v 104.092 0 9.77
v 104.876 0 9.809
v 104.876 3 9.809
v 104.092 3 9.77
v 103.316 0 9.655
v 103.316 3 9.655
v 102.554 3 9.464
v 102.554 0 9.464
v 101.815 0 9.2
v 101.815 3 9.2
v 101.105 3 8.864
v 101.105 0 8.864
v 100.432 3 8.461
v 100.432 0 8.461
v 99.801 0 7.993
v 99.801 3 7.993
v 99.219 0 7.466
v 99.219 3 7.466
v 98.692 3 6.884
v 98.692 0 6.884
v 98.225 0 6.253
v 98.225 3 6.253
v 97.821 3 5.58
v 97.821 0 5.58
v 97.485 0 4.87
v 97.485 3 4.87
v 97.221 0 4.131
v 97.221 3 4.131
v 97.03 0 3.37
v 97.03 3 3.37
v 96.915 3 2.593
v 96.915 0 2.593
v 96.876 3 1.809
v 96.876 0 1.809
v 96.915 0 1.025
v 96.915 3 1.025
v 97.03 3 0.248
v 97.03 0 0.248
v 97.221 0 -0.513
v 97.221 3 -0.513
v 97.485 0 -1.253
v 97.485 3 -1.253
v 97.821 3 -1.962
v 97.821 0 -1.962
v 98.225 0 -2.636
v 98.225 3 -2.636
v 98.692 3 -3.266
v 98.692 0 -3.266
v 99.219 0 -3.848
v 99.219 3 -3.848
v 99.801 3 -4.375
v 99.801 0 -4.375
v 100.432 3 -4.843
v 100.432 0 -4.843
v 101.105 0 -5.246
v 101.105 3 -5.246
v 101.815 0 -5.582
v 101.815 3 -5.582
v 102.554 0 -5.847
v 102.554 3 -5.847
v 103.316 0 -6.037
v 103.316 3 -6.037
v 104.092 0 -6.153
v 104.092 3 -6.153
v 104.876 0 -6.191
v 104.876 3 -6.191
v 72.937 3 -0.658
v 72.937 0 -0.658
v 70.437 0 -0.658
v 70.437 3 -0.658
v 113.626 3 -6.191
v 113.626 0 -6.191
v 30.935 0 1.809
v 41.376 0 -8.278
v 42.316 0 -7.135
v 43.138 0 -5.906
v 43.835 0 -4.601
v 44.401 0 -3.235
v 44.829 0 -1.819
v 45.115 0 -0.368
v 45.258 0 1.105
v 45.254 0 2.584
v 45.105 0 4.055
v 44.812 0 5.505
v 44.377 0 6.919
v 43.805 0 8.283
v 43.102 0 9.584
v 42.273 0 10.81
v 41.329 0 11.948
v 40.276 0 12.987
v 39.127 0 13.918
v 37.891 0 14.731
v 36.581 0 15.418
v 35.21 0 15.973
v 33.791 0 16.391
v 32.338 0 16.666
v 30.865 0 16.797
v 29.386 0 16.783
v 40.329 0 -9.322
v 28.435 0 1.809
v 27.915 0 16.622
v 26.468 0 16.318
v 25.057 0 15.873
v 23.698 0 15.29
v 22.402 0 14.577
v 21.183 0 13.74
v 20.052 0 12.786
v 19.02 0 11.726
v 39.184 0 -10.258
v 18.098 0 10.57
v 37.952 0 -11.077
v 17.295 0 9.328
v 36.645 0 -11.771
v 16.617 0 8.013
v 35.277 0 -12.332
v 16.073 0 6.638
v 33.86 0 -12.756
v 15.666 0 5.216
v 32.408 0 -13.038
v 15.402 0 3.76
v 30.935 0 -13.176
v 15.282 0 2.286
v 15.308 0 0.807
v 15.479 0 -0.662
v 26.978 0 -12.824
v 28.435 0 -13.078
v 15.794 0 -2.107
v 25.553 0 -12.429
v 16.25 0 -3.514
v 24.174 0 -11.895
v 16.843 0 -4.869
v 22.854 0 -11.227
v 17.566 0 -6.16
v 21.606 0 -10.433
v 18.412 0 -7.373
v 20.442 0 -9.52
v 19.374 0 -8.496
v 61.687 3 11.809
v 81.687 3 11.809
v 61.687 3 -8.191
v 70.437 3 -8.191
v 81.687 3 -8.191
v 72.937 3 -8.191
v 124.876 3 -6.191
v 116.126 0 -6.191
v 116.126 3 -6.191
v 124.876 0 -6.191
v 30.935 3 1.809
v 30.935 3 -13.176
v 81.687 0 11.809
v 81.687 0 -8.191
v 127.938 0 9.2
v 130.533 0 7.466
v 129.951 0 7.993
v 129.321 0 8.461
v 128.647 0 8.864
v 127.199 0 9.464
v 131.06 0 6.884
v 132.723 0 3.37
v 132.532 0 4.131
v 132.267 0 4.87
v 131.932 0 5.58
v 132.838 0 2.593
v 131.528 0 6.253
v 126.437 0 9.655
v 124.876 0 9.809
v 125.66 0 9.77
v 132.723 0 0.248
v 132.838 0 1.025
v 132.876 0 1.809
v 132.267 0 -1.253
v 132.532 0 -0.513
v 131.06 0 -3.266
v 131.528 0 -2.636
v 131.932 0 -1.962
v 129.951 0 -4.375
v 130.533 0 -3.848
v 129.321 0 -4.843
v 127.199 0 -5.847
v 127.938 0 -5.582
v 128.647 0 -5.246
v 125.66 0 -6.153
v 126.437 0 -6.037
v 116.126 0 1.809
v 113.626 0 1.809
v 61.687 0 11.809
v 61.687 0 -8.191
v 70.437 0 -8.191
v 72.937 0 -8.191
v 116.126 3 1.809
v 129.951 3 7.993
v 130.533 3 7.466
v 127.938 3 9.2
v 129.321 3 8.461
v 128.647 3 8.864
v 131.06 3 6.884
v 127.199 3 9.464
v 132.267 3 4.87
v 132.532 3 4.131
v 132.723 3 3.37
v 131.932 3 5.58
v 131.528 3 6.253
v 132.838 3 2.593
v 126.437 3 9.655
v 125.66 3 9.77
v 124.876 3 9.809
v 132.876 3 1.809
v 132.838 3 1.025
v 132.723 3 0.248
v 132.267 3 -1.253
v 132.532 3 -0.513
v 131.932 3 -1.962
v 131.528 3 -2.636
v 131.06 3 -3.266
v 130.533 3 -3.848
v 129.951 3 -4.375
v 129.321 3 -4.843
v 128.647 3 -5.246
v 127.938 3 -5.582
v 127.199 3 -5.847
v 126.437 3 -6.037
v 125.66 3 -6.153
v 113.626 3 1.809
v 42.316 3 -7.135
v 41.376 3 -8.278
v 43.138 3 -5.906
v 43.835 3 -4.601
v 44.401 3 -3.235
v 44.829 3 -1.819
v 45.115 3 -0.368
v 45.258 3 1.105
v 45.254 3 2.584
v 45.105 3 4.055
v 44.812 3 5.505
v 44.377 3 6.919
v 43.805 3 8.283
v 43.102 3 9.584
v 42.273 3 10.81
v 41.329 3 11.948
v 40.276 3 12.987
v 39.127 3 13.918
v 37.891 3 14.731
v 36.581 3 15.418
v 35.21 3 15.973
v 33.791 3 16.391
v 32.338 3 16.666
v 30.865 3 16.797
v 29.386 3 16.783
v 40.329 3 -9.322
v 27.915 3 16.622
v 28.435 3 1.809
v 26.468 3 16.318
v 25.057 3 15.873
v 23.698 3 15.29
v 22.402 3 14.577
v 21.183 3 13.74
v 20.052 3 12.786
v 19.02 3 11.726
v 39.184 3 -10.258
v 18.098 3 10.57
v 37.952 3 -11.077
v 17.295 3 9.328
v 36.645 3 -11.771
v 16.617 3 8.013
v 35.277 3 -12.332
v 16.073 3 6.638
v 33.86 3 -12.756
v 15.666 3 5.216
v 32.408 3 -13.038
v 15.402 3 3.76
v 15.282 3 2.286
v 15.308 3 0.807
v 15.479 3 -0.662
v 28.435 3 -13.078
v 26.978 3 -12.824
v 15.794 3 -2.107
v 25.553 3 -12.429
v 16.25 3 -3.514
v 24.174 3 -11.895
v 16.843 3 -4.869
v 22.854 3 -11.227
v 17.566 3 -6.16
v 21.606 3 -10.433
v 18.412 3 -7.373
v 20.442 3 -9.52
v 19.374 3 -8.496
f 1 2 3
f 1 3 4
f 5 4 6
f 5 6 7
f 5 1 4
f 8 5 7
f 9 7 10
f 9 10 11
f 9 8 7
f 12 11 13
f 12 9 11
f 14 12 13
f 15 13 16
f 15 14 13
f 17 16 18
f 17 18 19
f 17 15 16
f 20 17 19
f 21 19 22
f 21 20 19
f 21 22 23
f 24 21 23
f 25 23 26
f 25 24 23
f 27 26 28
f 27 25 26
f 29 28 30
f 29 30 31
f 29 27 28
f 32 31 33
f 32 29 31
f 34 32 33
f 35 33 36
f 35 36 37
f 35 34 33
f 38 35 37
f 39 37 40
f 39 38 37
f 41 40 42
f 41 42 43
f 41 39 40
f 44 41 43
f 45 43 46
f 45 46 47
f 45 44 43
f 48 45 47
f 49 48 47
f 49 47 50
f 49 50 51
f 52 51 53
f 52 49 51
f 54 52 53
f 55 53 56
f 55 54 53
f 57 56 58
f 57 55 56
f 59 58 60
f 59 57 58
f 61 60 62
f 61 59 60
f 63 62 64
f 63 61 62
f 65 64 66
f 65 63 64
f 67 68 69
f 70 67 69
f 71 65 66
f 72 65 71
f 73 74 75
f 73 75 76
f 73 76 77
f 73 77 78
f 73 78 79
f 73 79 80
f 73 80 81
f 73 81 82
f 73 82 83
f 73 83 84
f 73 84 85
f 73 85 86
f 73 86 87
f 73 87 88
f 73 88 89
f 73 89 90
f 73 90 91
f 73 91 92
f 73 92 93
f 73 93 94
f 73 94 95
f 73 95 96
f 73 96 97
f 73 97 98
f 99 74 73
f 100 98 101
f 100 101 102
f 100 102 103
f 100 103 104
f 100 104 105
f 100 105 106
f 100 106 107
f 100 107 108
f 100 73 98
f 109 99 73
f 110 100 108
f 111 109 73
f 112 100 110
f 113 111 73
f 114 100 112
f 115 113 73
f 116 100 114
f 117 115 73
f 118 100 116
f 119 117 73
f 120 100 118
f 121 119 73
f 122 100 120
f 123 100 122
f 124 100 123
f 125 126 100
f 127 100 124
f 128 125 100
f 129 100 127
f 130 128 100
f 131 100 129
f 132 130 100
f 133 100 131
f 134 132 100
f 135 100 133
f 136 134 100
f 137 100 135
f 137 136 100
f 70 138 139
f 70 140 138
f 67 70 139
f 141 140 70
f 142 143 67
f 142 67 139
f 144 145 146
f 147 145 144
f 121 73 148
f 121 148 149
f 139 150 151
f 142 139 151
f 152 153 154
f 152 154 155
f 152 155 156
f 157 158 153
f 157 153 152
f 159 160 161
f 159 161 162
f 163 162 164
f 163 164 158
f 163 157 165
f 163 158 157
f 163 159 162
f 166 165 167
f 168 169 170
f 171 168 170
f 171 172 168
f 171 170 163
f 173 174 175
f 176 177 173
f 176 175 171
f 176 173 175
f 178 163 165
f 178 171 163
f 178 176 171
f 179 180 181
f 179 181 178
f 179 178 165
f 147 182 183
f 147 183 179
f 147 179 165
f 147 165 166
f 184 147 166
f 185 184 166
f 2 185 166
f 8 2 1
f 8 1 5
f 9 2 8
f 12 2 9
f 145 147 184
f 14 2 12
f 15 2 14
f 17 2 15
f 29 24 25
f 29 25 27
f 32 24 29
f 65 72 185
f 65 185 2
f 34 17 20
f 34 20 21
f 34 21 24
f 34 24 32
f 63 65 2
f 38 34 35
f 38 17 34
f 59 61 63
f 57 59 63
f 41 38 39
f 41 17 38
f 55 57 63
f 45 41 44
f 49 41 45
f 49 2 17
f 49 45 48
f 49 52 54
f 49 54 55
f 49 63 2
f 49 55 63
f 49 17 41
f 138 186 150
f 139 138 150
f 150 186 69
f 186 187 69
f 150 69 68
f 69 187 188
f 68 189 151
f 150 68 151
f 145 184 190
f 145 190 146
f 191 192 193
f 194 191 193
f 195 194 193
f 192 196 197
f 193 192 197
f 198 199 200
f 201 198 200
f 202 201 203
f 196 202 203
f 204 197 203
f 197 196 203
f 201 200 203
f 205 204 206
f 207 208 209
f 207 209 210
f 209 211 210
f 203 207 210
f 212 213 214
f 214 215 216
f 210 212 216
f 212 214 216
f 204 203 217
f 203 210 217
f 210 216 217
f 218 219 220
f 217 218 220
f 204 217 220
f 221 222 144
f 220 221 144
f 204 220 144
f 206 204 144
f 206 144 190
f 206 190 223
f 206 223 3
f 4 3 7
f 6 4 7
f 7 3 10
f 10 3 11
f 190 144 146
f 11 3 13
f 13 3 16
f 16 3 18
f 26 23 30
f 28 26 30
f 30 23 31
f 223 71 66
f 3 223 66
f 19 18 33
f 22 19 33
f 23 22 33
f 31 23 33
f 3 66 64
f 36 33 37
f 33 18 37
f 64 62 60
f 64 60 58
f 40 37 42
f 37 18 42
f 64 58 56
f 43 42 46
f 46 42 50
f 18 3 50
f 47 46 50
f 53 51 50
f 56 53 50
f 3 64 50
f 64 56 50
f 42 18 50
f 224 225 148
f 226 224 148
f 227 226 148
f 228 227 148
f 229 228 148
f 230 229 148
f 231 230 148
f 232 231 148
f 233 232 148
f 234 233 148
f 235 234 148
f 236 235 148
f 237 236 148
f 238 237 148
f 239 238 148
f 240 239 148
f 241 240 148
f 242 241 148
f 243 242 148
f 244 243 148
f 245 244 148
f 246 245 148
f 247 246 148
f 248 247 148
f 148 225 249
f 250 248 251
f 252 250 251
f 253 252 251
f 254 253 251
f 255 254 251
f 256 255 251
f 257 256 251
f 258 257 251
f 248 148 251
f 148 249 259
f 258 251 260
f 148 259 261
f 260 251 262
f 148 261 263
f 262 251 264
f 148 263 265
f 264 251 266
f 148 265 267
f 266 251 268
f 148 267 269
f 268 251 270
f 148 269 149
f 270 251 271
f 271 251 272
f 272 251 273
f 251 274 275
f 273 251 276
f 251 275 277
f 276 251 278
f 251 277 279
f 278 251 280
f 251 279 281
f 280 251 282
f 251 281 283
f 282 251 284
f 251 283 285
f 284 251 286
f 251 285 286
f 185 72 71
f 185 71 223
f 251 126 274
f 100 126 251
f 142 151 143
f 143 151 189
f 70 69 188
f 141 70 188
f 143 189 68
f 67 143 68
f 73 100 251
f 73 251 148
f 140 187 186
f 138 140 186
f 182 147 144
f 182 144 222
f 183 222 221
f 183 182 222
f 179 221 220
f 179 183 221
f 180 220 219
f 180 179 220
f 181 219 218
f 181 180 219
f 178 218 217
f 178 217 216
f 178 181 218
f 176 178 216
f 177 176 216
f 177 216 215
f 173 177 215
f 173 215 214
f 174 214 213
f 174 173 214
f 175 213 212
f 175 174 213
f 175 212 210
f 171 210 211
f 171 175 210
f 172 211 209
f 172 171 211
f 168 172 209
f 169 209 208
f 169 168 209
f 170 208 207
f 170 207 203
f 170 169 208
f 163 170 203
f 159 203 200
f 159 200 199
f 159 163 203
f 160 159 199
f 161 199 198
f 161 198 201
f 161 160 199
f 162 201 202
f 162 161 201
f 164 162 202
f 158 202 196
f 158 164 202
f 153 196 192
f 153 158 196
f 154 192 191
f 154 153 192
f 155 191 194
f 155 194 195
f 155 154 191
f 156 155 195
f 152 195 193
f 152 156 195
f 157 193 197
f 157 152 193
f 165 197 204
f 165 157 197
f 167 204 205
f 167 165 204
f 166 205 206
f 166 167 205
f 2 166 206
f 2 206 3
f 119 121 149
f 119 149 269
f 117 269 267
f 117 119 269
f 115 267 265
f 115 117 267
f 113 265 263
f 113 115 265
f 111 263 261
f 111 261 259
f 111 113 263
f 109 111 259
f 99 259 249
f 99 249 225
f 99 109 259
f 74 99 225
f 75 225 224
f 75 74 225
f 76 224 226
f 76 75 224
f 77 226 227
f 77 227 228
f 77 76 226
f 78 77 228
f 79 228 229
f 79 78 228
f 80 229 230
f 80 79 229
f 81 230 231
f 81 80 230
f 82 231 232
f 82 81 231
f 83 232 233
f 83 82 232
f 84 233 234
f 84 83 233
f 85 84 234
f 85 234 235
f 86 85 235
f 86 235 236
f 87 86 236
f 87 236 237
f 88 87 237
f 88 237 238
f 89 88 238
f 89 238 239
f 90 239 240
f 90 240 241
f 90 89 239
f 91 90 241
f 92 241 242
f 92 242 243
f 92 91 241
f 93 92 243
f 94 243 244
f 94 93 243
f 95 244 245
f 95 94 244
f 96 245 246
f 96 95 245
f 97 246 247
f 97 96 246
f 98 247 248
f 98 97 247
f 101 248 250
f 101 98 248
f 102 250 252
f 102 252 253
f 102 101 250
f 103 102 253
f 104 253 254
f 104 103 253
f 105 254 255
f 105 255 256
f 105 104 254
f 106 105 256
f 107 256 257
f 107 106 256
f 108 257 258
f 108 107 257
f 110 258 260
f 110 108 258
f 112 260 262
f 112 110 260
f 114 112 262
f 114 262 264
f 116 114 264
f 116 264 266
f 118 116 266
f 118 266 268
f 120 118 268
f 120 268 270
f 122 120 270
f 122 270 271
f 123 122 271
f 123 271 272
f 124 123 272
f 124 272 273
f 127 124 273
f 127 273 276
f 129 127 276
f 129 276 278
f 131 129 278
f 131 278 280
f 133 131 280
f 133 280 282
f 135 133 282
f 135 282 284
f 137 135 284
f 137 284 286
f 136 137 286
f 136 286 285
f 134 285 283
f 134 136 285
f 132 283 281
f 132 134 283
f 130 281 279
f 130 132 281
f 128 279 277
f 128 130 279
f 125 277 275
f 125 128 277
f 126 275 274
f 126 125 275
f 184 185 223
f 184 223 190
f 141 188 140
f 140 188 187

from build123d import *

# Parameters (mm, degrees)
BOSS_EXTRUDE1_DEPTH   = 3
BOSS_EXTRUDE1_2_DEPTH = 3
BOSS_EXTRUDE1_3_DEPTH = 3


with BuildPart() as part:
    # Sketch1 → Boss-Extrude1 (new body)
    with BuildSketch(Plane(origin=(0, 0, 0), x_dir=(1, 0, 0), z_dir=(0, 1, 0))):
        with BuildLine():
            Line((28.435413078, 13.077958274), (28.435413078, -1.808926439))
            Line((28.435413078, -1.808926439), (30.935413078, -1.808926439))
            Line((30.935413078, -1.808926439), (30.935413078, 13.176487365))
            ThreePointArc((30.935413078, 13.176487365), (30.864787109, -16.797290414), (28.435413078, 13.077958274))
        make_face()
    extrude(amount=BOSS_EXTRUDE1_DEPTH)


with BuildPart() as body_2:
    # Sketch1 → Boss-Extrude1 2 (new body)
    with BuildSketch(Plane(origin=(0, 0, 0), x_dir=(1, 0, 0), z_dir=(0, 1, 0))):
        Polygon((61.687252638, -11.808926439), (81.687252638, -11.808926439), (81.687252638, 8.191073561), (72.937252638, 8.191073561), (72.937252638, 0.658425471), (70.437252638, 0.658425471), (70.437252638, 8.191073561), (61.687252638, 8.191073561), align=None)
    extrude(amount=BOSS_EXTRUDE1_2_DEPTH)


with BuildPart() as body_3:
    # Sketch1 → Boss-Extrude1 3 (new body)
    with BuildSketch(Plane(origin=(0, 0, 0), x_dir=(1, 0, 0), z_dir=(0, 1, 0))):
        with BuildLine():
            Line((104.876295826, 6.191073561), (113.626295826, 6.191073561))
            Line((113.626295826, 6.191073561), (113.626295826, -1.808926439))
            Line((113.626295826, -1.808926439), (116.126295826, -1.808926439))
            Line((116.126295826, -1.808926439), (116.126295826, 6.191073561))
            Line((116.126295826, 6.191073561), (124.876295826, 6.191073561))
            ThreePointArc((124.876295826, 6.191073561), (132.876295826, -1.808926439), (124.876295826, -9.808926439))
            Line((124.876295826, -9.808926439), (104.876295826, -9.808926439))
            ThreePointArc((104.876295826, -9.808926439), (96.876295826, -1.808926439), (104.876295826, 6.191073561))
        make_face()
    extrude(amount=BOSS_EXTRUDE1_3_DEPTH)


solid = Compound([part.part, body_2.part, body_3.part])
